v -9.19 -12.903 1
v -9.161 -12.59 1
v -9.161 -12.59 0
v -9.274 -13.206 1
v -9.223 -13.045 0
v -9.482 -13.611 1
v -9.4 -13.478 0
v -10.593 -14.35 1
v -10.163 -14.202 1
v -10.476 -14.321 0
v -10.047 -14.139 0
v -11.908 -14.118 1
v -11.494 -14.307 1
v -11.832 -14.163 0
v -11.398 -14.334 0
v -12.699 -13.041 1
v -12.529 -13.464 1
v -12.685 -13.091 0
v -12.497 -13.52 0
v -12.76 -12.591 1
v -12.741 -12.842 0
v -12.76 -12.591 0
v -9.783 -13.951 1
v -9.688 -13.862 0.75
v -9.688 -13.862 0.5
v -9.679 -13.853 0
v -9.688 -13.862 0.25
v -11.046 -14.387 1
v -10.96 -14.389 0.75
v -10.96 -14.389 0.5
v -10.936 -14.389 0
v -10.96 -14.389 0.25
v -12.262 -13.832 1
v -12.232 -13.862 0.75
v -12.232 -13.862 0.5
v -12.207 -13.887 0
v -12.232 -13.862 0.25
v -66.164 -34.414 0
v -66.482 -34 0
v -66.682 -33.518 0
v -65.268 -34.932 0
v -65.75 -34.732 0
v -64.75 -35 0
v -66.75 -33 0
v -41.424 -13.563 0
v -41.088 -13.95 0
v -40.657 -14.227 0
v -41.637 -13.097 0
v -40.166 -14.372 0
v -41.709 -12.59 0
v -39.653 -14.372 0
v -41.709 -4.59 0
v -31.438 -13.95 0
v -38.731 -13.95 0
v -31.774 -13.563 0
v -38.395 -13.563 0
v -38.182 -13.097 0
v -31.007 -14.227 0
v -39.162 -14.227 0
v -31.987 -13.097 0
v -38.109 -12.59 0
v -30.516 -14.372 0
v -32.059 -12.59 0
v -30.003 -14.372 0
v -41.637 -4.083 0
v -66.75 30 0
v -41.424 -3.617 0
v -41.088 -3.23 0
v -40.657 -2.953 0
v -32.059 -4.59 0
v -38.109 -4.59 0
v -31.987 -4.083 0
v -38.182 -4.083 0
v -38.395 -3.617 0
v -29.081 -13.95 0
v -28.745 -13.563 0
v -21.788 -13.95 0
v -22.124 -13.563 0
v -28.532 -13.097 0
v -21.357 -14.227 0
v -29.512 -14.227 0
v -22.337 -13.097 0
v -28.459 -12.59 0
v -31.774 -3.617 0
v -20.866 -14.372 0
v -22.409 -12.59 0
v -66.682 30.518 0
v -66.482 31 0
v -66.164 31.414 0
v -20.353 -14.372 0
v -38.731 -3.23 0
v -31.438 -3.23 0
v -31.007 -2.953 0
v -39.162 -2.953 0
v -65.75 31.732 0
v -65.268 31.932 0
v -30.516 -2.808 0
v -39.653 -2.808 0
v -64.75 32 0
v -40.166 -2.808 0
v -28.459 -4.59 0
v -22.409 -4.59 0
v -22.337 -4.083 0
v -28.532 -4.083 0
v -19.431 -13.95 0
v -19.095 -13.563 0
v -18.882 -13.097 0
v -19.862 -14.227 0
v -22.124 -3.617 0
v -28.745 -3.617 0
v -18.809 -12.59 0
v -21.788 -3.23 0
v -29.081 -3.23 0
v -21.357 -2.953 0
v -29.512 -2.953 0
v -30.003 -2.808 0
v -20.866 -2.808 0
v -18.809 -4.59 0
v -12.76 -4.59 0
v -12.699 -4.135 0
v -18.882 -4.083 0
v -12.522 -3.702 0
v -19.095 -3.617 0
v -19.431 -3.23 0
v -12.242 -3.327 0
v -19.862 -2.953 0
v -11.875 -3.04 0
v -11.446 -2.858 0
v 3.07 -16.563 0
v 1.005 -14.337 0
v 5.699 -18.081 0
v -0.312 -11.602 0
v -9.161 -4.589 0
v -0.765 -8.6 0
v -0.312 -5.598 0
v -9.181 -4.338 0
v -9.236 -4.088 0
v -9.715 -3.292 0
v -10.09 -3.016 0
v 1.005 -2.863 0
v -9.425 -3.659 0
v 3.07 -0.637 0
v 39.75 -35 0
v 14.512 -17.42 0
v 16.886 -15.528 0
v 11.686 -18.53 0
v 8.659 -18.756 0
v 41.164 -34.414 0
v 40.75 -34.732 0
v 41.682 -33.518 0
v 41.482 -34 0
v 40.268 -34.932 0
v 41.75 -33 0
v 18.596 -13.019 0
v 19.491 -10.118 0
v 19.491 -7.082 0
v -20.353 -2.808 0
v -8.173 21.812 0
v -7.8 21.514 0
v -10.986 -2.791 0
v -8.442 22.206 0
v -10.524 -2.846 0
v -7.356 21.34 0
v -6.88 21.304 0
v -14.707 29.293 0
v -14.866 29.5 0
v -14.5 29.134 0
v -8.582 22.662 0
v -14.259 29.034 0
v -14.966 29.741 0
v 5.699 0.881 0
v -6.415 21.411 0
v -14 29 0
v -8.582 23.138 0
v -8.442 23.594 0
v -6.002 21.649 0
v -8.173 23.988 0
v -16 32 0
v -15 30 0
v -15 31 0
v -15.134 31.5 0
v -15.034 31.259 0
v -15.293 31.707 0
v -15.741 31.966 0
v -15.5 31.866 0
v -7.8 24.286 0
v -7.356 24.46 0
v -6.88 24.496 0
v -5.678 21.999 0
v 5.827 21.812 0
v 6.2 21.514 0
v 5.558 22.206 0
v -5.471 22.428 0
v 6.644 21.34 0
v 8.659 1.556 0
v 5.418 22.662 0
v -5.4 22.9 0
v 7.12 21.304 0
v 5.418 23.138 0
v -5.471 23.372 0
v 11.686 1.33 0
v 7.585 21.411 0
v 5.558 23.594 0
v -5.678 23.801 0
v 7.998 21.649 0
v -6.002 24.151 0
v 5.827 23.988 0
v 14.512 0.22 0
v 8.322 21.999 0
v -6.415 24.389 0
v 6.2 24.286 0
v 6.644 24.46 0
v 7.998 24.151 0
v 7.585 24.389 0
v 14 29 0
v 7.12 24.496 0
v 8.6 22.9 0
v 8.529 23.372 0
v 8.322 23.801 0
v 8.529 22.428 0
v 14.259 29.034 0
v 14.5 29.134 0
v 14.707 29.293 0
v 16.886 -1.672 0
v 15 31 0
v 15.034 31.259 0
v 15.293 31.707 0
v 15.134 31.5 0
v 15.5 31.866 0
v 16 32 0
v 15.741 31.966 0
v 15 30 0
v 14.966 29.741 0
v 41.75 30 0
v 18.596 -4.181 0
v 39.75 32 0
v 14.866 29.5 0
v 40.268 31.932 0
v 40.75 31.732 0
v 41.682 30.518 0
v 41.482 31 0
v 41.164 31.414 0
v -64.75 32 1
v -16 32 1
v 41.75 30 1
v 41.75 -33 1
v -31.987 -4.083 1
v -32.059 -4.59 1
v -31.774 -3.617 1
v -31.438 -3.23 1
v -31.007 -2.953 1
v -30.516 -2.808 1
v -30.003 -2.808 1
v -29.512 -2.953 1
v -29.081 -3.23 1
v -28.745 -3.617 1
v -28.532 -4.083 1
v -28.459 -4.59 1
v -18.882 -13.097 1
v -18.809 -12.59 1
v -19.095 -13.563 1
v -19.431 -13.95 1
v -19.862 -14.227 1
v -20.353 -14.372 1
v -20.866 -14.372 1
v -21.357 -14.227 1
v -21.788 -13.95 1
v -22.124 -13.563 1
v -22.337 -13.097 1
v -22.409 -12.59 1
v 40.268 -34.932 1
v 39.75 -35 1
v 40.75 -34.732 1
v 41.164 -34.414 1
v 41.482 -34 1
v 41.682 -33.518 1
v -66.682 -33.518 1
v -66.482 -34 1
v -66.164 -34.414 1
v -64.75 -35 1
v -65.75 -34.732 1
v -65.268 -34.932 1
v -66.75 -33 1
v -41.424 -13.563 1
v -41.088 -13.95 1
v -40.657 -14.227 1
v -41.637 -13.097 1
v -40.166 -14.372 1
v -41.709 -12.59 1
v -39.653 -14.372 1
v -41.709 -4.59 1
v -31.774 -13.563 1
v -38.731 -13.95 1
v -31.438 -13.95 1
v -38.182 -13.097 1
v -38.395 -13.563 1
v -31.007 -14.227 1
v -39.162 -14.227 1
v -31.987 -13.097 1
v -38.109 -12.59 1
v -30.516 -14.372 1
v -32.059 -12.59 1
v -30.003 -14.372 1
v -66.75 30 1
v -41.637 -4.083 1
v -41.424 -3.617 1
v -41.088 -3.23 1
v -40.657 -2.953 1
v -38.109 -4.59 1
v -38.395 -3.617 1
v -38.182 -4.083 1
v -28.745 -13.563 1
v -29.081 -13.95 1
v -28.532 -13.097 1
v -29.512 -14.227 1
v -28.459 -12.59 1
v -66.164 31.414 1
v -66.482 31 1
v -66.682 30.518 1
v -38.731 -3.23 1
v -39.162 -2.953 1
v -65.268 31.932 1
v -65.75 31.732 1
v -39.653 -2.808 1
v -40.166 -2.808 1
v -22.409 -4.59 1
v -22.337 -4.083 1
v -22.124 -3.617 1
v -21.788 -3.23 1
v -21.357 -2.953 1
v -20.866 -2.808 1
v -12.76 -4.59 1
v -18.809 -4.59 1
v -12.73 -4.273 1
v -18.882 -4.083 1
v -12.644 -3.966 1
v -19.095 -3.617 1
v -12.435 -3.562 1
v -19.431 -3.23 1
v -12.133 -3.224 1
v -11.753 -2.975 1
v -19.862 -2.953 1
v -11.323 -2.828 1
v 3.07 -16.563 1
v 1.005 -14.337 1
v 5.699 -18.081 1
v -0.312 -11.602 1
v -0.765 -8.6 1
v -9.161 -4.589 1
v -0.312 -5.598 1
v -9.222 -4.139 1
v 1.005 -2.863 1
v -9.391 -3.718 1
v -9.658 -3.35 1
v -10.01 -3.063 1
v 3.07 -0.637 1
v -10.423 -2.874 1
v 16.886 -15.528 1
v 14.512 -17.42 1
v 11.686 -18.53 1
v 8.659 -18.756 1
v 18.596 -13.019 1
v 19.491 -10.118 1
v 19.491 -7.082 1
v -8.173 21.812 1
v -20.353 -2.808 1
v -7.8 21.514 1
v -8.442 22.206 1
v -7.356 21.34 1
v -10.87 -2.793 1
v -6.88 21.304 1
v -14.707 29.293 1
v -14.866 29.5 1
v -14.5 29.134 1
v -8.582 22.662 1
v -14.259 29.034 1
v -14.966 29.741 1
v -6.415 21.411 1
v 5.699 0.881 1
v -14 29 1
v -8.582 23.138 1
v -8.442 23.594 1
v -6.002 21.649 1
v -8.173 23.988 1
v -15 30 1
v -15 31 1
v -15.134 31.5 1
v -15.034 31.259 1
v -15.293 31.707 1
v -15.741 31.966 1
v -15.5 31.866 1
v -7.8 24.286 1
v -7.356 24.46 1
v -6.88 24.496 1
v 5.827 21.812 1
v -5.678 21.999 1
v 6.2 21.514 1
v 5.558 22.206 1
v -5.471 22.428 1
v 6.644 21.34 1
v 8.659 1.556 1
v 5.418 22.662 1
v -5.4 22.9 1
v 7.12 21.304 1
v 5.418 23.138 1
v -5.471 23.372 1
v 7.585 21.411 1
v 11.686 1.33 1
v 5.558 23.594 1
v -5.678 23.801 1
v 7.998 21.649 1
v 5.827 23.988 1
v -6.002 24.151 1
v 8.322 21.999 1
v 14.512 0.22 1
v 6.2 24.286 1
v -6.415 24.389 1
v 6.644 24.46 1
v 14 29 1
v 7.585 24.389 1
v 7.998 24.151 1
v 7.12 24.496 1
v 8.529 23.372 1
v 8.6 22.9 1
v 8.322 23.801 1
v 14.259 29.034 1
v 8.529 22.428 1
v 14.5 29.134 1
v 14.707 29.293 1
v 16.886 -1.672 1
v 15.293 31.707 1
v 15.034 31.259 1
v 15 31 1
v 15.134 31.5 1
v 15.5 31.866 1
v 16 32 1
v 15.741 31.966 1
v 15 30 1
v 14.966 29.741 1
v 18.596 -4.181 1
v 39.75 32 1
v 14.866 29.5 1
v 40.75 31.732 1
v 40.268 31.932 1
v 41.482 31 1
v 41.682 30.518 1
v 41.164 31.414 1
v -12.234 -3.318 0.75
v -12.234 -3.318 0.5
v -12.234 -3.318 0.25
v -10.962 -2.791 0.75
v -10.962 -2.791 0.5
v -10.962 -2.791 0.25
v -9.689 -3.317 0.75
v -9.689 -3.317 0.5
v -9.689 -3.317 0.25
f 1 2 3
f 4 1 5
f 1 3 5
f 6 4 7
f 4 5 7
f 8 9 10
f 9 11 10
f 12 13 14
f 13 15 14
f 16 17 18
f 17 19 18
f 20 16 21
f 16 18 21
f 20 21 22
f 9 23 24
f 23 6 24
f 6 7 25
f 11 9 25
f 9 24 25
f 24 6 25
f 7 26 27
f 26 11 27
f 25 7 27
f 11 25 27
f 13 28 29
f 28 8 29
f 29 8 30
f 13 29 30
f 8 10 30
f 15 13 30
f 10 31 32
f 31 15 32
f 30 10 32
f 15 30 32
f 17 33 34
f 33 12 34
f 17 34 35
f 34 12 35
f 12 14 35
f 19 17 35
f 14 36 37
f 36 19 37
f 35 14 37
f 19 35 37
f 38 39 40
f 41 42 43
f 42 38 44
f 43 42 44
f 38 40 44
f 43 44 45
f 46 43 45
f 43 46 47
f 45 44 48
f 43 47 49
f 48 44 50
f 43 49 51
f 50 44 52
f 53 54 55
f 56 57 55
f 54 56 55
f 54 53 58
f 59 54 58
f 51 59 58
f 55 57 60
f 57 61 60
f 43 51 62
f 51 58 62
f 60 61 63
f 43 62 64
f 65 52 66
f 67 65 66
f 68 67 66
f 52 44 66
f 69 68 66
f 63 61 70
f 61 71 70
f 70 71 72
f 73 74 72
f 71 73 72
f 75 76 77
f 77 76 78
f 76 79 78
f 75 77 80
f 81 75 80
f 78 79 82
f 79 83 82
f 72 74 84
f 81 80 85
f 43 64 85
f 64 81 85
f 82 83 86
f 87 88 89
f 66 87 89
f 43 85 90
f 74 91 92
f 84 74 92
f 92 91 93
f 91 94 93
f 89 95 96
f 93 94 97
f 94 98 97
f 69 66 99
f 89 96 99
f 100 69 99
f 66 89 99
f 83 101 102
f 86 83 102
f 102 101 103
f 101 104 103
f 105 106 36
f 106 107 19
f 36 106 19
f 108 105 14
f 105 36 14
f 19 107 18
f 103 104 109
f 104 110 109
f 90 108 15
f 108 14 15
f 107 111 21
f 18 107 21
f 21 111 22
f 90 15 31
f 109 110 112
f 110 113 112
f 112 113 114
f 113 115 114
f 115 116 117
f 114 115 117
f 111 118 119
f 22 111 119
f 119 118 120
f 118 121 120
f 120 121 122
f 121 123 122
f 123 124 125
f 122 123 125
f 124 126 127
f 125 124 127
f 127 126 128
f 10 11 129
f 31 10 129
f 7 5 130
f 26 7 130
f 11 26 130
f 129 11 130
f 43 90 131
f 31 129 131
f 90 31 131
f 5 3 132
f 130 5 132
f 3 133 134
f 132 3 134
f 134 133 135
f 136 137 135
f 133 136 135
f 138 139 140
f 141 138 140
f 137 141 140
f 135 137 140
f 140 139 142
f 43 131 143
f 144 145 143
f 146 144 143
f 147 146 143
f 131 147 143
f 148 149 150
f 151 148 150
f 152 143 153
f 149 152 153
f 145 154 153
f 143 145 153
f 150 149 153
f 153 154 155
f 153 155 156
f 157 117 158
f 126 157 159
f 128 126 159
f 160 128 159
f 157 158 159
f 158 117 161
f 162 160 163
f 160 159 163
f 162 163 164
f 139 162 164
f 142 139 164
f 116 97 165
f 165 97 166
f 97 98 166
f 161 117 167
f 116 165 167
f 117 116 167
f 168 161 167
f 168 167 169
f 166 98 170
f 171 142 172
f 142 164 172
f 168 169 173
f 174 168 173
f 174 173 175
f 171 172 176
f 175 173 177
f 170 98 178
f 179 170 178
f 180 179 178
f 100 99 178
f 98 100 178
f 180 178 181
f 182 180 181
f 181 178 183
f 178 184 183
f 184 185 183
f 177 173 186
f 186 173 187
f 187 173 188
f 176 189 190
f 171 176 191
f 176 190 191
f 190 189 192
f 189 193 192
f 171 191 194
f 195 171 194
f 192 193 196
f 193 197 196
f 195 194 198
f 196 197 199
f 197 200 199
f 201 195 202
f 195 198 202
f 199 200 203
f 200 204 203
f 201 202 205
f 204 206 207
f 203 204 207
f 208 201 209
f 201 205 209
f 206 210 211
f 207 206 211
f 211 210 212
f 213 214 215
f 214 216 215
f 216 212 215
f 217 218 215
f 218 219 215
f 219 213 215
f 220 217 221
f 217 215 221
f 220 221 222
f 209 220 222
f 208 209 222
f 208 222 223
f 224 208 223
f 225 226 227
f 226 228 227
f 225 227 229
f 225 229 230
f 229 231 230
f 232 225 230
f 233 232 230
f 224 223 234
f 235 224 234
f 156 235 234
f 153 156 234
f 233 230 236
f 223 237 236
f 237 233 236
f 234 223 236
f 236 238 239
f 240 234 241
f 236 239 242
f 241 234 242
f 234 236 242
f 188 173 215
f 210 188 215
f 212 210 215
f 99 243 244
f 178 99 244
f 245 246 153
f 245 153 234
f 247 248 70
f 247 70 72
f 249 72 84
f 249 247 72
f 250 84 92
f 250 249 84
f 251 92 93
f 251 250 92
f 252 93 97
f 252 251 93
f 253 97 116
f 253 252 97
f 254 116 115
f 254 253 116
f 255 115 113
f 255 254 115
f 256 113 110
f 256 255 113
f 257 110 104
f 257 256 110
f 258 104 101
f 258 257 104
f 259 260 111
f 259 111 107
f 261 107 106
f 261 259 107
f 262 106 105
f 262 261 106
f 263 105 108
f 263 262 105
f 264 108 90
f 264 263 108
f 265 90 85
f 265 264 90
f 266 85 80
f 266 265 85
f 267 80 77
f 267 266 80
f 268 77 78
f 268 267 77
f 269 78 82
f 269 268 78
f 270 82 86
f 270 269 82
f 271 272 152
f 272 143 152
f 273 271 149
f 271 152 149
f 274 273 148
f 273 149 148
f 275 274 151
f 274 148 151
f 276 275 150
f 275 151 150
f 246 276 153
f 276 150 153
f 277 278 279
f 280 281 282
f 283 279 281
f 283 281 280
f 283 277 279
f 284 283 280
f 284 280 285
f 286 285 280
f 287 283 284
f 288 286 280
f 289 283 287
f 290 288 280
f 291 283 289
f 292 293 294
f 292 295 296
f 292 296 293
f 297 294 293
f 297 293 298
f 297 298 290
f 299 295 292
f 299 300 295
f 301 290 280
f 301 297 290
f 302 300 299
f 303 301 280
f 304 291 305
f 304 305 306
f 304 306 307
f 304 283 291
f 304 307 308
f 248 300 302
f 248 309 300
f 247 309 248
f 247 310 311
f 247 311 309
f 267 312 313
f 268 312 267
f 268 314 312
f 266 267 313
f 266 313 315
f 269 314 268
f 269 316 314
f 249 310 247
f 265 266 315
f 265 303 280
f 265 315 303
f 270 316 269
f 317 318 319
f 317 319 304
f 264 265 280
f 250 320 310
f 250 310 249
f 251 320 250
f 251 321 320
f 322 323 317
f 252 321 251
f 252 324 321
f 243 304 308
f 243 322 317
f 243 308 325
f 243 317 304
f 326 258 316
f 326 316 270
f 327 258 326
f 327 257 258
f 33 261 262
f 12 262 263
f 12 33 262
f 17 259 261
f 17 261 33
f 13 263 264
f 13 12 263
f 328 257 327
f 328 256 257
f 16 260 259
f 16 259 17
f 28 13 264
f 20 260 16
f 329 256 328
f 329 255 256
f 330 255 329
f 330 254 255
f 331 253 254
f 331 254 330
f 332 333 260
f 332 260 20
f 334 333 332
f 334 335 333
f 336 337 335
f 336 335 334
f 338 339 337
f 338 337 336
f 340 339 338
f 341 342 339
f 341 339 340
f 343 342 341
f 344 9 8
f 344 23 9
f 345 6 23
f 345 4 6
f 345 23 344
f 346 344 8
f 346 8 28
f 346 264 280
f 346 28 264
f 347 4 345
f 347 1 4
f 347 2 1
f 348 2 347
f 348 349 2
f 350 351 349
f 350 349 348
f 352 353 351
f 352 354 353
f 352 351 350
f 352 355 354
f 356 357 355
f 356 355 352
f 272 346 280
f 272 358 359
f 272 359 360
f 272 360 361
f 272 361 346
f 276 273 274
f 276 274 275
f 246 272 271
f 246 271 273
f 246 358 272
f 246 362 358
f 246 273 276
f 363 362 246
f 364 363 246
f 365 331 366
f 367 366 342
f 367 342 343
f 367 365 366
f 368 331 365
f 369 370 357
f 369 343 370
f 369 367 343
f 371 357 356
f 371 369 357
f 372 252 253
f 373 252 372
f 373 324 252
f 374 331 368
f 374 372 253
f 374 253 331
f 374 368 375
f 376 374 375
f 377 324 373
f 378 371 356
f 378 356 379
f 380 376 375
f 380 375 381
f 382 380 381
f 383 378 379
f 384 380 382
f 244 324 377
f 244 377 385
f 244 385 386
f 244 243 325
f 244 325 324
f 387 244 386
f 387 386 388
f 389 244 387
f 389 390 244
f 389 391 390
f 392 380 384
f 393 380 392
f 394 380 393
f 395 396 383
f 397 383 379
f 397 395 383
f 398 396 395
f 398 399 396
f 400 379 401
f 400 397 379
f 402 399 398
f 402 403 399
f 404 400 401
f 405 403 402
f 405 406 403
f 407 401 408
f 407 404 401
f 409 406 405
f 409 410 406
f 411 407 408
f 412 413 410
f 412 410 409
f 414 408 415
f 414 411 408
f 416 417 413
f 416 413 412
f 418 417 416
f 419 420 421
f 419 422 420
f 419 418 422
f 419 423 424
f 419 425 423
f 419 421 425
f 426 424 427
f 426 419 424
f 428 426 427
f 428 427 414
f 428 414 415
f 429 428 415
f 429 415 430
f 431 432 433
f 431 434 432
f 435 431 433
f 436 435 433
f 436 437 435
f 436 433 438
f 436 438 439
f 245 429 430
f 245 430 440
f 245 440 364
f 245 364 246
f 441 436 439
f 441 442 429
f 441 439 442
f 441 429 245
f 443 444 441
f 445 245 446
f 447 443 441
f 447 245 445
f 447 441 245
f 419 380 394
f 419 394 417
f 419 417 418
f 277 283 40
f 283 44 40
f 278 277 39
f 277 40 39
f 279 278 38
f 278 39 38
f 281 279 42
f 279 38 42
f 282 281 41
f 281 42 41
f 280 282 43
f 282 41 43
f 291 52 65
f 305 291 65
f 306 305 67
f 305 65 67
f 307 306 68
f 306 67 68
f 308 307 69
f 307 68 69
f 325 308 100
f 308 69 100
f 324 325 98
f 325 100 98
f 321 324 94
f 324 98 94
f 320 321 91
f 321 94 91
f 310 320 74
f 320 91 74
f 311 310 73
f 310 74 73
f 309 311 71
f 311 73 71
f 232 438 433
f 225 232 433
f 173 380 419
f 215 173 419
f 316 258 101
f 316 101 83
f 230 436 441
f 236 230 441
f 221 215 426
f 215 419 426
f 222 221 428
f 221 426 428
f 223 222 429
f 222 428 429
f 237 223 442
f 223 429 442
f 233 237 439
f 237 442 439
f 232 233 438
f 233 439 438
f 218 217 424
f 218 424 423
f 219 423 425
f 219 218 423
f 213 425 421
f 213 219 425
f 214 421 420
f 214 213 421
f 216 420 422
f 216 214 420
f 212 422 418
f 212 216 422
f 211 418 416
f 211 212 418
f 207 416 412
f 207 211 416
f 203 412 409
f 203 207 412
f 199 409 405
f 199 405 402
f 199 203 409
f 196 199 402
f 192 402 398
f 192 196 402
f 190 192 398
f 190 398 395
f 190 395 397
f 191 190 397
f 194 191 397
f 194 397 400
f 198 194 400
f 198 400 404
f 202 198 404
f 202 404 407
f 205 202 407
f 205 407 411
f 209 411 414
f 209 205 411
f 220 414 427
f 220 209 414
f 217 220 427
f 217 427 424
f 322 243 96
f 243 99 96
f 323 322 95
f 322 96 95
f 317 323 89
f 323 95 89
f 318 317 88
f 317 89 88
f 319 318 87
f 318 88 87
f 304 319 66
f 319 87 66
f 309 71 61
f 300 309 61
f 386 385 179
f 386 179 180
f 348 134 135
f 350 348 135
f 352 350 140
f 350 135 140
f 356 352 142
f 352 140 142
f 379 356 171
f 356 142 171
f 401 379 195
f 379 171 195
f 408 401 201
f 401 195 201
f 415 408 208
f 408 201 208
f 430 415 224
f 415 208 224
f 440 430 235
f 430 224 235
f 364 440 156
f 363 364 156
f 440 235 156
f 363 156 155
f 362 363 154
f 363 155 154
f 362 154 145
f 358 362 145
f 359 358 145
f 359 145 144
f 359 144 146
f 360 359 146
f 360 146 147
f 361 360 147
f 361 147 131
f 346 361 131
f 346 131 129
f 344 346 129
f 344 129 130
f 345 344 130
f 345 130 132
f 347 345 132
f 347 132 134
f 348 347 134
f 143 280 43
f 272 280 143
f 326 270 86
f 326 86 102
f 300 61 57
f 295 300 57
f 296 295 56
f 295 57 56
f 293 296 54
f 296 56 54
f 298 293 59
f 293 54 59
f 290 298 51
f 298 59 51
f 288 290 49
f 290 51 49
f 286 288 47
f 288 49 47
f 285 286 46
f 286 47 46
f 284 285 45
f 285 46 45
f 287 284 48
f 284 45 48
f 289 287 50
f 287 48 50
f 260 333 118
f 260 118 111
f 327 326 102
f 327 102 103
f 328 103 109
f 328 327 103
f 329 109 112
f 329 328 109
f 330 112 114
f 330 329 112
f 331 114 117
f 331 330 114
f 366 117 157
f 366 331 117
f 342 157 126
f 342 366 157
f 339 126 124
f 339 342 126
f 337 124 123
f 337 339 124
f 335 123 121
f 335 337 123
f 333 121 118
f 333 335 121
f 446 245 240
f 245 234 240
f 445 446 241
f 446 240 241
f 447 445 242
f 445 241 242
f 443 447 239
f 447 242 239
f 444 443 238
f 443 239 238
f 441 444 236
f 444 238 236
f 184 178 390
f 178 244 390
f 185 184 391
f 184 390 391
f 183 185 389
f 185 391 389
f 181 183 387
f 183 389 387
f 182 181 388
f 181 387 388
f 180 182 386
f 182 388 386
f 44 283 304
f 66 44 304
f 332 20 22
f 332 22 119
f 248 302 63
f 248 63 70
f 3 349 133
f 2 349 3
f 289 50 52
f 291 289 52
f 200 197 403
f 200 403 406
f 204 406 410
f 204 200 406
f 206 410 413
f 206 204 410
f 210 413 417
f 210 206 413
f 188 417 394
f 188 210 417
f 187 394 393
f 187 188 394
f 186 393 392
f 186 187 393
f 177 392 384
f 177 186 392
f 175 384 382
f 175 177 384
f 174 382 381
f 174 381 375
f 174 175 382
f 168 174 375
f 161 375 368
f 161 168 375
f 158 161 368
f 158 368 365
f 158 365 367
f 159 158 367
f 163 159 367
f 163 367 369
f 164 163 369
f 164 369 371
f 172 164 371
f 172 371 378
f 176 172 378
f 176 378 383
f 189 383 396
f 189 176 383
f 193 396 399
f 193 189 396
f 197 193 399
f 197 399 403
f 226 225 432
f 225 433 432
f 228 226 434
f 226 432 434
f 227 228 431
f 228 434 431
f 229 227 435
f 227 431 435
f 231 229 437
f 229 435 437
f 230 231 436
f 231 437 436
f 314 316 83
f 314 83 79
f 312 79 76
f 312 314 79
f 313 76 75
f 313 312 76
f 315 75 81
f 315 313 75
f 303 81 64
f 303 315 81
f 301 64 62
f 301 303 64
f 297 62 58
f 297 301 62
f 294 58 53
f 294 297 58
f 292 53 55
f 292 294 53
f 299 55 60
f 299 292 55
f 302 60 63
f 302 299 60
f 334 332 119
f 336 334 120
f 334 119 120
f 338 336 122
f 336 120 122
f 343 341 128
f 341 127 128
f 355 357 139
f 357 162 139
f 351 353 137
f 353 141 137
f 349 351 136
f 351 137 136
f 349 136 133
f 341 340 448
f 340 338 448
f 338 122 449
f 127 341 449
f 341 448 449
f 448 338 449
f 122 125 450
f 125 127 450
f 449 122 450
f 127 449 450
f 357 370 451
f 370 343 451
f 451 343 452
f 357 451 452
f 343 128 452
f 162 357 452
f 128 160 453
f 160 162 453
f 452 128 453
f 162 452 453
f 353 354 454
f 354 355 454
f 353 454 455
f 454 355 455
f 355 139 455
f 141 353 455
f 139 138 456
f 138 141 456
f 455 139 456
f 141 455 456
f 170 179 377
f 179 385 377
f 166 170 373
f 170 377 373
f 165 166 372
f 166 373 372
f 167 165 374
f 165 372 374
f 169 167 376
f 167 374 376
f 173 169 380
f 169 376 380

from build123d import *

# Parameters (mm, degrees)
SKETCH_1_W          = 127.5
SKETCH_1_H          = 70
SKETCH_1_R          = 1.6
EXTRUDE_1_DEPTH     = 1
SKETCH_2_W          = 127.5
SKETCH_2_H          = 3
CUT_EXTRUDE_1_DEPTH = 10
SKETCH_3_W          = 22
SKETCH_3_H          = 67
CUT_EXTRUDE_2_DEPTH = 10
SKETCH_4_W          = 3
SKETCH_4_H          = 67
EXTRUDE_3_DEPTH     = 1
SKETCH_5_W          = 30
SKETCH_5_H          = 6
CUT_EXTRUDE_3_DEPTH = 5
FILLET_1_R          = 1
FILLET_2_R          = 2
SKETCH_6_R          = 10.184947092
CUT_EXTRUDE_4_DEPTH = 5


with BuildPart() as part:
    # 草图1 → 凸台-拉伸1 (new body)
    with BuildSketch(Plane.XY):
        Rectangle(SKETCH_1_W, SKETCH_1_H)
        with Locations((-7, 22.9)):
            Circle(SKETCH_1_R, mode=Mode.SUBTRACT)
        with Locations((7, 22.9)):
            Circle(SKETCH_1_R, mode=Mode.SUBTRACT)
    extrude(amount=EXTRUDE_1_DEPTH)

    # 草图2 → 切除-拉伸1 (cut)
    with BuildSketch(Plane.XY.offset(1)):
        with Locations((0, 33.5)):
            Rectangle(SKETCH_2_W, SKETCH_2_H)
    extrude(amount=-CUT_EXTRUDE_1_DEPTH, mode=Mode.SUBTRACT)

    # 草图3 → 切除-拉伸2 (cut)
    with BuildSketch(Plane.XY.offset(1)):
        with Locations((52.75, -1.5)):
            Rectangle(SKETCH_3_W, SKETCH_3_H)
    extrude(amount=-CUT_EXTRUDE_2_DEPTH, mode=Mode.SUBTRACT)

    # 草图4 → 凸台-拉伸3 (add)
    with BuildSketch(Plane.XY.offset(1)):
        with Locations((-65.25, -1.5)):
            Rectangle(SKETCH_4_W, SKETCH_4_H)
    extrude(amount=-EXTRUDE_3_DEPTH)

    # 草图5 → 切除-拉伸3 (cut, symmetric)
    with BuildSketch(Plane.XY.offset(1)):
        with Locations((0, 32)):
            Rectangle(SKETCH_5_W, SKETCH_5_H)
    extrude(amount=CUT_EXTRUDE_3_DEPTH, both=True, mode=Mode.SUBTRACT)

    # 圆角1
    fillet_1_edges = [part.edges().sort_by_distance(p)[0] for p in [
        (-15, 32, 0.5),
        (15, 32, 0.5),
        (15, 29, 0.5),
        (-15, 29, 0.5),
    ]]
    fillet(fillet_1_edges, radius=FILLET_1_R)

    # 圆角2
    fillet_2_edges = [part.edges().sort_by_distance(p)[0] for p in [
        (41.75, 32, 0.5),
        (41.75, -35, 0.5),
        (-66.75, -35, 0.5),
        (-66.75, 32, 0.5),
    ]]
    fillet(fillet_2_edges, radius=FILLET_2_R)

    # 草图6 → 切除-拉伸4 (cut, symmetric)
    with BuildSketch(Plane(origin=(0, 0, 0), x_dir=(-1, 0, 0), z_dir=(0, 0, -1))):
        with Locations((-9.42, -8.6)):
            Circle(SKETCH_6_R)
        with BuildLine():
            Line((12.759998774, -12.590828373), (12.760187446, -4.590023504))
            add(Edge.make_bspline(
                [(12.760187446, -4.590023504), (12.76034149, -4.131184745), (12.371605061, -3.175167995), (10.96226041, -2.598669542), (9.551855004, -3.173570847), (9.161664376, -4.130045812), (9.161317678, -4.589244926)],
                knots=[0.000124436, 0.000124436, 0.000124436, 0.000124436, 0.250093327, 0.500062218, 0.750031109, 1, 1, 1, 1], degree=3))
            Line((9.161317678, -4.589244926), (9.160940723, -12.589969013))
            add(Edge.make_bspline(
                [(9.160940723, -12.589969013), (9.16093388, -13.04878603), (9.54993428, -14.004593398), (10.95932287, -14.580864951), (12.369900224, -14.00523711), (12.759249328, -13.049723173), (12.759998774, -12.590828373)],
                knots=[-6.415e-06, -6.415e-06, -6.415e-06, -6.415e-06, 0.250075228, 0.50015687, 0.750238513, 1.000320156, 1.000320156, 1.000320156, 1.000320156], degree=3))
        make_face()
        with BuildLine():
            Line((22.409427896, -12.590000012), (22.409427896, -4.589999921))
            ThreePointArc((22.409427896, -4.589999921), (20.60943071, -2.790002734), (18.809433524, -4.589999921))
            Line((18.809433524, -4.589999921), (18.809433524, -12.590000012))
            ThreePointArc((18.809433524, -12.590000012), (20.60943071, -14.389997198), (22.409427896, -12.590000012))
        make_face()
        with BuildLine():
            Line((32.059432501, -12.590000012), (32.059432501, -4.589999921))
            ThreePointArc((32.059432501, -4.589999921), (30.259435314, -2.790002734), (28.459438128, -4.589999921))
            Line((28.459438128, -4.589999921), (28.459438128, -12.590000012))
            ThreePointArc((28.459438128, -12.590000012), (30.259435314, -14.389997198), (32.059432501, -12.590000012))
        make_face()
        with BuildLine():
            Line((41.709430966, -12.590000012), (41.709430966, -4.589999921))
            ThreePointArc((41.709430966, -4.589999921), (39.90943378, -2.790002734), (38.109436593, -4.589999921))
            Line((38.109436593, -4.589999921), (38.109436593, -12.590000012))
            ThreePointArc((38.109436593, -12.590000012), (39.90943378, -14.389997198), (41.709430966, -12.590000012))
        make_face()
    extrude(amount=CUT_EXTRUDE_4_DEPTH, both=True, mode=Mode.SUBTRACT)


solid = part.part
